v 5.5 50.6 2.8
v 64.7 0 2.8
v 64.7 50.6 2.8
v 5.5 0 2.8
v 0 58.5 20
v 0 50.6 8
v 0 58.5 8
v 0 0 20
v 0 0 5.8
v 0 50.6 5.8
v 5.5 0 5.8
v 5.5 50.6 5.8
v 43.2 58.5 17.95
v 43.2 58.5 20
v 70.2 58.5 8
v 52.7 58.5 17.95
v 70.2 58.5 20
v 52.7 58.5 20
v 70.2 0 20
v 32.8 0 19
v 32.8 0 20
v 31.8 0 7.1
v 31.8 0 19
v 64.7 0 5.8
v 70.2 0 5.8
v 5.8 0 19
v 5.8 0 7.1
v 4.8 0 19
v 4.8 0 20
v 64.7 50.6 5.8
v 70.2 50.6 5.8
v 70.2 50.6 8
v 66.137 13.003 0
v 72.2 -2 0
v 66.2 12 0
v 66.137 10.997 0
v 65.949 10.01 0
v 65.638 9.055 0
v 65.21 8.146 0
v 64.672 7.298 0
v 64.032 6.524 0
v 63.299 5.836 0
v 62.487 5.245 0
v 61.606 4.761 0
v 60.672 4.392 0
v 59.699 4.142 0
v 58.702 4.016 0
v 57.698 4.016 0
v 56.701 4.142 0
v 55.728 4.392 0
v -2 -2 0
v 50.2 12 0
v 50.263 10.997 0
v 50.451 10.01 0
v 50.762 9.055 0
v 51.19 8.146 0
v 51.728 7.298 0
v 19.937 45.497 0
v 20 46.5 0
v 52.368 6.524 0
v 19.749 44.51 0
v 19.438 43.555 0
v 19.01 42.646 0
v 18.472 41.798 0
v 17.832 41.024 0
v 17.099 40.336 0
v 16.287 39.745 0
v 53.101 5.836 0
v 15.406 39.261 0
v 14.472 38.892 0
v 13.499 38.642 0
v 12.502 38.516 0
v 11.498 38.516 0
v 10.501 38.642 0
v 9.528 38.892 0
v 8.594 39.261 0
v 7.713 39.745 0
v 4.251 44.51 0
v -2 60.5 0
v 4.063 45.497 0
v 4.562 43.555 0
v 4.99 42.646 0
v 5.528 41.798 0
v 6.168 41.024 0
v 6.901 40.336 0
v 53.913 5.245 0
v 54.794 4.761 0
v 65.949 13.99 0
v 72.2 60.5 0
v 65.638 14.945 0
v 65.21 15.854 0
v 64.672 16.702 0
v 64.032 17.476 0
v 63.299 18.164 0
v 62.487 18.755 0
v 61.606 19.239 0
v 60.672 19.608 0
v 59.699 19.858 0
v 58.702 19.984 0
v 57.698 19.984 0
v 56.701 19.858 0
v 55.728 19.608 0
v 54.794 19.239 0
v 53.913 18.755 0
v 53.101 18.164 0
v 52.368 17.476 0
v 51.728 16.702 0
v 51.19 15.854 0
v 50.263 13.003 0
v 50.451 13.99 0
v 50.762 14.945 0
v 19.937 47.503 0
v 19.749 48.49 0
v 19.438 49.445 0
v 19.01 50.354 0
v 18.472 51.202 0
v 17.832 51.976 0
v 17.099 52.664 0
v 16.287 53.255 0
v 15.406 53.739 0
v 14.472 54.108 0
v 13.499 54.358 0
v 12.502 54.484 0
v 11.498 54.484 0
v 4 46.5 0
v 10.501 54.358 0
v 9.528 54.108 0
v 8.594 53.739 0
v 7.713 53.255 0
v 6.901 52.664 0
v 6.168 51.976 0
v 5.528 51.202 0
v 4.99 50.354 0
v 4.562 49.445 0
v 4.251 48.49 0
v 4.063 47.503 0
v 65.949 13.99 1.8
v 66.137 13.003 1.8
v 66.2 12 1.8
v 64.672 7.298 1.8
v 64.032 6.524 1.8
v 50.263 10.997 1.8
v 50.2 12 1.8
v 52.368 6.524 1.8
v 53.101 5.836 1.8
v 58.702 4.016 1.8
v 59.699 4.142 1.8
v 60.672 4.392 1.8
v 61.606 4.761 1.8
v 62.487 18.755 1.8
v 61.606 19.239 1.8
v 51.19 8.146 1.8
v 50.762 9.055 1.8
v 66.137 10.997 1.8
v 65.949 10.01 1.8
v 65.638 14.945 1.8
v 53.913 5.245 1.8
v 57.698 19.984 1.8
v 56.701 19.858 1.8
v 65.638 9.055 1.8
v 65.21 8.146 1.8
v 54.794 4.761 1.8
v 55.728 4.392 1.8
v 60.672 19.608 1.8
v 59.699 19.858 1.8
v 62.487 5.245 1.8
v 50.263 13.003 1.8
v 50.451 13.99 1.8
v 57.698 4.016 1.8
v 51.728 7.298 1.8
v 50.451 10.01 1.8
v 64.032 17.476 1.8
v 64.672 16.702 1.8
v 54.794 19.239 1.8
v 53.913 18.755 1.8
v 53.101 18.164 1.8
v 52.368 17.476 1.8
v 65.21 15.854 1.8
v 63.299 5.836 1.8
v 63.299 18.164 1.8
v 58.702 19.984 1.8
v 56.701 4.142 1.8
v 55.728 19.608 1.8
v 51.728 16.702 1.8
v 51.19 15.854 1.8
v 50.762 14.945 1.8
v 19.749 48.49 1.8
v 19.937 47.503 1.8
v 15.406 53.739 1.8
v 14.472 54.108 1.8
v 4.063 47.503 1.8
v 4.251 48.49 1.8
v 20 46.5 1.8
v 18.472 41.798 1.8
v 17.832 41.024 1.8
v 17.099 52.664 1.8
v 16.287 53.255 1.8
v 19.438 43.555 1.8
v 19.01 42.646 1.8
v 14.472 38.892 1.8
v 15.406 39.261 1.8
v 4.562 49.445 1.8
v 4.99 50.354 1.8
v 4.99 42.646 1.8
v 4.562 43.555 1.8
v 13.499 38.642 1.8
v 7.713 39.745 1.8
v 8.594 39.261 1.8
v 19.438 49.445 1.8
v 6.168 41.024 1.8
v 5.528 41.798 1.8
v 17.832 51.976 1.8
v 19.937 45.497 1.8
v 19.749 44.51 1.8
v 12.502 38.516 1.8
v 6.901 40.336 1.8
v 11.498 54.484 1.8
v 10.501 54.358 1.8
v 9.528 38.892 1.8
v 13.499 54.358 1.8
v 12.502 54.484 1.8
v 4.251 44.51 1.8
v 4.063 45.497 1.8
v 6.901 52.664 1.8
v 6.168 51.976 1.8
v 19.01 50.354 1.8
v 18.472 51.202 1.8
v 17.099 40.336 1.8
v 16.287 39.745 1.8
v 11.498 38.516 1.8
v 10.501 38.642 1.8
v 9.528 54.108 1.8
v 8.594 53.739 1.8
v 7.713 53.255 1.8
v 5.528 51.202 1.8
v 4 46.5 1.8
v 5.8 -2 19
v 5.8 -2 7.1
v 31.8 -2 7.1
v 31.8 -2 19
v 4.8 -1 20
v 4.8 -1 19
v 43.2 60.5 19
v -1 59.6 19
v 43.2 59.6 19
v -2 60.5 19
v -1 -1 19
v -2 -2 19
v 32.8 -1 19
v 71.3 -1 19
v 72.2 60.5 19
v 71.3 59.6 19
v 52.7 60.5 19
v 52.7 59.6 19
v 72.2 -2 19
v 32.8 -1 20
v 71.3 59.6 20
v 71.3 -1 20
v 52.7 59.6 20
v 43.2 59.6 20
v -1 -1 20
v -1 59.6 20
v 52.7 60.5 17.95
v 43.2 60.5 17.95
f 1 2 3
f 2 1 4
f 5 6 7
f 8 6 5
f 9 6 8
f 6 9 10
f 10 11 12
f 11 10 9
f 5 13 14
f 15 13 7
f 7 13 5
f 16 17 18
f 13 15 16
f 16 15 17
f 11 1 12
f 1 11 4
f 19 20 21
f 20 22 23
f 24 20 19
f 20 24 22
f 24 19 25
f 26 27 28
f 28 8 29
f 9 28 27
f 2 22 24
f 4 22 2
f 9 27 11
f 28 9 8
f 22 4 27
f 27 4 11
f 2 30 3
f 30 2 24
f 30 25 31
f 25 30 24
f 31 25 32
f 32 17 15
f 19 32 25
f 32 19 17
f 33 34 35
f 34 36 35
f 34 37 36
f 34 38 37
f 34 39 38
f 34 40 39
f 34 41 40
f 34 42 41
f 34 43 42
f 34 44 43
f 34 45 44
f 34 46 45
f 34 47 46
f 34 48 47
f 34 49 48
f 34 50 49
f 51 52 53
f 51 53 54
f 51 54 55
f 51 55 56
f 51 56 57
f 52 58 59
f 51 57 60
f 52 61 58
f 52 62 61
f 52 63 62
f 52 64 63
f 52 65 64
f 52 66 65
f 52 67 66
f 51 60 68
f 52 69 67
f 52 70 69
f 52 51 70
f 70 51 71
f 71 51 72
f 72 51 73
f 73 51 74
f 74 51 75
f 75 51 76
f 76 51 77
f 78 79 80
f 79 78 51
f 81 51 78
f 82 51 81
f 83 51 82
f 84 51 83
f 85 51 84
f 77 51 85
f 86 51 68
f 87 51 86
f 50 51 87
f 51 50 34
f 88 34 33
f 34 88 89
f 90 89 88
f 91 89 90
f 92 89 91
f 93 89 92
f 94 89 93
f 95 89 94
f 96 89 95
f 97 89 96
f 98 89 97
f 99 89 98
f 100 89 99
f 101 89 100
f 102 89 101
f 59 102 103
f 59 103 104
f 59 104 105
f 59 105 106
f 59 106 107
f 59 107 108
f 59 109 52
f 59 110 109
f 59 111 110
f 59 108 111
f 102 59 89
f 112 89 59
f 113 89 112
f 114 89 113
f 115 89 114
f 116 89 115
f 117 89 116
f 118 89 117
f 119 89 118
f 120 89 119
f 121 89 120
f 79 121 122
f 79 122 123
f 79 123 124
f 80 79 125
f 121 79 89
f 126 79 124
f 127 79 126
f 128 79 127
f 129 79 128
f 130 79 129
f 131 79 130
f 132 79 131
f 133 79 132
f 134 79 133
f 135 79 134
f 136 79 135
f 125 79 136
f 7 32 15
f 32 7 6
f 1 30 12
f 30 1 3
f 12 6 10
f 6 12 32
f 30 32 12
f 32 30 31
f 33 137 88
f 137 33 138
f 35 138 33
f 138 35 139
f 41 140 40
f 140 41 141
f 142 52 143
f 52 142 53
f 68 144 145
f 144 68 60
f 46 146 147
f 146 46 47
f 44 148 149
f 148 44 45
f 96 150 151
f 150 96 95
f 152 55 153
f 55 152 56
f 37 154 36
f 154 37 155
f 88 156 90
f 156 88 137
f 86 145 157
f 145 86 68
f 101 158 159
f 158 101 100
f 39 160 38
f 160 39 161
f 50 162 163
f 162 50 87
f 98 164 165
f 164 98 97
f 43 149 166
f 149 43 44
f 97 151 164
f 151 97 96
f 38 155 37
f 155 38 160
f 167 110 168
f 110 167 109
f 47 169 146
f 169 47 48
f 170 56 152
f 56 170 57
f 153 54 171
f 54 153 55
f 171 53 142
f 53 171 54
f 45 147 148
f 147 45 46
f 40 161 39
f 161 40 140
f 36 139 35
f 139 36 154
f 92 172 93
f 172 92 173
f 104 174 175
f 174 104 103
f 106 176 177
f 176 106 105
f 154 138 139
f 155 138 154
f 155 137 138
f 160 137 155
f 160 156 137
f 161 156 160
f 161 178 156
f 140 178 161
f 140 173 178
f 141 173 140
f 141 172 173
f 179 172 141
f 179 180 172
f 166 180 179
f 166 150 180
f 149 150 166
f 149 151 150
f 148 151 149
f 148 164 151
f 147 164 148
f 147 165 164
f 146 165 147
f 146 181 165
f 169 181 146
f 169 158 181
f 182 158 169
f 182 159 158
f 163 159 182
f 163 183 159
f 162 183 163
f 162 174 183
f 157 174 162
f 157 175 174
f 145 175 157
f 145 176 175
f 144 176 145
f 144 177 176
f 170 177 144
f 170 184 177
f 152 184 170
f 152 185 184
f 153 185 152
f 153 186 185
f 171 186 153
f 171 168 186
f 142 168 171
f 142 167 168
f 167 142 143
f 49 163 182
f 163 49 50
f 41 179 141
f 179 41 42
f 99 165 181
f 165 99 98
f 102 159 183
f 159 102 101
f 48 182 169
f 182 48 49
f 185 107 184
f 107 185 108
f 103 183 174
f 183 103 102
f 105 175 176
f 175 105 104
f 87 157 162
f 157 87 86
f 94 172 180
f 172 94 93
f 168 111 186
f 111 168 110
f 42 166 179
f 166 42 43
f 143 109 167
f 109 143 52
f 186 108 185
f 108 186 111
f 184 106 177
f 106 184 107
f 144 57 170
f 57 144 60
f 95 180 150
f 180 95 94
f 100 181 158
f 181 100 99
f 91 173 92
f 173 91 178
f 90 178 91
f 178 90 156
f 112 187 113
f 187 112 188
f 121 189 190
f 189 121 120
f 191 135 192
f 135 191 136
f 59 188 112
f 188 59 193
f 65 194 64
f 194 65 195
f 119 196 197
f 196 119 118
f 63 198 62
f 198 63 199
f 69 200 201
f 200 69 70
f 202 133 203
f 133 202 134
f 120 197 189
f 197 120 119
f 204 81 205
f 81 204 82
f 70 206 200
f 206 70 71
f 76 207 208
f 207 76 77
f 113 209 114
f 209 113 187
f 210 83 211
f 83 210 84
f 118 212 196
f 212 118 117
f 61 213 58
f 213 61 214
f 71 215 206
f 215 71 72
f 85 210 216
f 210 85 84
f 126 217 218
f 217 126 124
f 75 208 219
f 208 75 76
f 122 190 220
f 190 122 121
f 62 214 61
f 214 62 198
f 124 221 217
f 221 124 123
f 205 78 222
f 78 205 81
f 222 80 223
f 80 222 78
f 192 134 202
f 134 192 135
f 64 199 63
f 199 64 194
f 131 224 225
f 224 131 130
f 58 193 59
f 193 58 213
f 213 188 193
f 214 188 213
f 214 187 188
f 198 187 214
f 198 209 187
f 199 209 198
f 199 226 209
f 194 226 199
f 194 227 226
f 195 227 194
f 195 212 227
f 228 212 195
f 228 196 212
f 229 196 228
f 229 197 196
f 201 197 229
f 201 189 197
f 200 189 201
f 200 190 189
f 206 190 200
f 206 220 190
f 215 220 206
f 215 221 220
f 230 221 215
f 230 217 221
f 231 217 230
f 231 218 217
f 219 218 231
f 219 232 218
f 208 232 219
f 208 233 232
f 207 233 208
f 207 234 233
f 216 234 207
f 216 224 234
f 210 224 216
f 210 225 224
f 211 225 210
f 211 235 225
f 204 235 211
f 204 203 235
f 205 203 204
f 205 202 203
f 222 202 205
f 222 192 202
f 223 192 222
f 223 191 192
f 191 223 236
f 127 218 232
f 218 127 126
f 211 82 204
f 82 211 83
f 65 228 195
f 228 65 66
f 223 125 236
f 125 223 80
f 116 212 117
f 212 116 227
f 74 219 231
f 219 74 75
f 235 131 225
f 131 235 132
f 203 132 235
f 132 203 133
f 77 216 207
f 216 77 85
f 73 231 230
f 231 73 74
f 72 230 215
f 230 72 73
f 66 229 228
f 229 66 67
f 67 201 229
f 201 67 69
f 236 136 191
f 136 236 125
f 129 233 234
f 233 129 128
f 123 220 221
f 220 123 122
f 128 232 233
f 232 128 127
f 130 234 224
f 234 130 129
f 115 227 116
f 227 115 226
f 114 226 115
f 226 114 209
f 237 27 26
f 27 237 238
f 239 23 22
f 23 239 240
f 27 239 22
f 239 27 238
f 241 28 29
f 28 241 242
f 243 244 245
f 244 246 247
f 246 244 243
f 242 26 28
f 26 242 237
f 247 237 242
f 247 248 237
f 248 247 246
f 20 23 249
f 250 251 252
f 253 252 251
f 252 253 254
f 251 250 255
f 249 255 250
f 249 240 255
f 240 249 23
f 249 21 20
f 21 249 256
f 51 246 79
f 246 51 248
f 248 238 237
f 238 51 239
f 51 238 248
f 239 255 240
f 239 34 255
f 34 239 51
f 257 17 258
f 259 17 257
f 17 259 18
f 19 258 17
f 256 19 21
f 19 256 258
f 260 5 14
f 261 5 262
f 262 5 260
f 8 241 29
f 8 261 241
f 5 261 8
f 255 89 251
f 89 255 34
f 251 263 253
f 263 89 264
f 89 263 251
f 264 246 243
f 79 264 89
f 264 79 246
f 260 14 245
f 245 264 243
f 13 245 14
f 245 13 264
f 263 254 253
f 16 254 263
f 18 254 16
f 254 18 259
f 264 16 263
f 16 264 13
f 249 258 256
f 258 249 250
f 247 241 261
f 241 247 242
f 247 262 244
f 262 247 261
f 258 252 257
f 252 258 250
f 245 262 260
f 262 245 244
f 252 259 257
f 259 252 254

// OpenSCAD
// file: variables.scad
$fn=50;

eps = .1;

boardD = [70.2,58.5];
boardH = 1.2;
sidesThikness=2;
connectorsWidth = 26;
connectorsX=5.8;
usbD=[9.5,2];
// main file
include <variables.scad>

baseH = 2.8;
padD = [5.5, boardD.y];
padH = 3;
sidesH = baseH + padH + boardH + 13;
magnetR = 16/2;
magnetH = 1.8;
magnetPos = [12,12];

difference() {
    union() {
        linear_extrude(baseH) square(boardD);
        pads();
    }
    union() {
        translate([boardD.x-magnetPos.x,magnetPos.y,-eps]) magnet();
        translate([magnetPos.x,boardD.y-magnetPos.y,-eps]) magnet();
    }
}

difference() {
    union() {
        front();
        back();
        side();
        translate([boardD.x+sidesThikness,0,0]) side();
    }
    snaps();
}

module pads() {
    innerBoardD=[70.3,50.6];
    translate([0,0,baseH]) linear_extrude(padH) square(padD);
    translate([boardD.x-padD.x,0,baseH]) linear_extrude(padH) square(padD);
    translate([0,innerBoardD.y,0]) linear_extrude(baseH + padH + boardH + 1) square([boardD.x, boardD.y-innerBoardD.y]);
}

module magnet() {
    linear_extrude(magnetH+eps) circle(magnetR);
}

module snaps() {
    snap=1;
    //front
    translate([-sidesThikness-eps/2,-sidesThikness-eps,sidesH-snap]) 
        linear_extrude(snap+eps) 
            square([boardD.x+2*sidesThikness+eps, snap+eps]);
    
    //left
    translate([-sidesThikness-eps,-sidesThikness-eps/2,sidesH-snap]) 
        linear_extrude(1+eps) 
            square([1+eps,boardD.y+2*sidesThikness+eps]);
    //right
    translate([boardD.x+snap+eps,-sidesThikness-eps/2,sidesH-snap]) 
        linear_extrude(1+eps) 
            square([1+eps,boardD.y+2*sidesThikness+eps]);
    //back
    translate([-sidesThikness-eps/2,boardD.y+snap+eps,sidesH-snap]) 
        linear_extrude(snap+eps) 
            square([boardD.x+2*sidesThikness+eps, snap+eps]);
}

module front() {
    connectorsD=[connectorsWidth,sidesH-(baseH+padH+boardH)];
    connectorsPos=[connectorsX,sidesH-connectorsD.y];
    rotate([90,0,0]) {
        difference() {
            translate([-sidesThikness,0,0]) 
                linear_extrude(sidesThikness) square([boardD.x+2*sidesThikness, sidesH]);
            union() {
                translate([connectorsPos.x,sidesH-connectorsD.y+eps,-eps/2]) 
                    linear_extrude(sidesThikness+eps) square([connectorsD.x,connectorsD.y+eps]);
                translate([connectorsPos.x-1,sidesH-1,-eps/2]) 
                    linear_extrude(sidesThikness+eps) square([1+eps,1+eps]);
                translate([connectorsPos.x+connectorsD.x-eps,sidesH-1,-eps/2]) 
                    linear_extrude(sidesThikness+eps) square([1+eps,1+eps]);
            }
        }
    }
}

module back() {
    translate([0,boardD.y+sidesThikness,0]) rotate([90,0,0]) 
        difference() {
            translate([-sidesThikness,0,0]) 
                linear_extrude(sidesThikness) 
                    square([boardD.x+2*sidesThikness, sidesH]);
            translate([boardD.x-17.5-usbD.x,sidesH-usbD.y-eps/2,-eps/2]) 
                linear_extrude(sidesThikness+eps) square([usbD.x,usbD.y+eps]);    
        }
}

module side() {
    rotate([0,-90,0]) 
        translate([0,-sidesThikness,0]) 
            linear_extrude(sidesThikness) 
                square([sidesH, boardD.y+2*sidesThikness]);
}
